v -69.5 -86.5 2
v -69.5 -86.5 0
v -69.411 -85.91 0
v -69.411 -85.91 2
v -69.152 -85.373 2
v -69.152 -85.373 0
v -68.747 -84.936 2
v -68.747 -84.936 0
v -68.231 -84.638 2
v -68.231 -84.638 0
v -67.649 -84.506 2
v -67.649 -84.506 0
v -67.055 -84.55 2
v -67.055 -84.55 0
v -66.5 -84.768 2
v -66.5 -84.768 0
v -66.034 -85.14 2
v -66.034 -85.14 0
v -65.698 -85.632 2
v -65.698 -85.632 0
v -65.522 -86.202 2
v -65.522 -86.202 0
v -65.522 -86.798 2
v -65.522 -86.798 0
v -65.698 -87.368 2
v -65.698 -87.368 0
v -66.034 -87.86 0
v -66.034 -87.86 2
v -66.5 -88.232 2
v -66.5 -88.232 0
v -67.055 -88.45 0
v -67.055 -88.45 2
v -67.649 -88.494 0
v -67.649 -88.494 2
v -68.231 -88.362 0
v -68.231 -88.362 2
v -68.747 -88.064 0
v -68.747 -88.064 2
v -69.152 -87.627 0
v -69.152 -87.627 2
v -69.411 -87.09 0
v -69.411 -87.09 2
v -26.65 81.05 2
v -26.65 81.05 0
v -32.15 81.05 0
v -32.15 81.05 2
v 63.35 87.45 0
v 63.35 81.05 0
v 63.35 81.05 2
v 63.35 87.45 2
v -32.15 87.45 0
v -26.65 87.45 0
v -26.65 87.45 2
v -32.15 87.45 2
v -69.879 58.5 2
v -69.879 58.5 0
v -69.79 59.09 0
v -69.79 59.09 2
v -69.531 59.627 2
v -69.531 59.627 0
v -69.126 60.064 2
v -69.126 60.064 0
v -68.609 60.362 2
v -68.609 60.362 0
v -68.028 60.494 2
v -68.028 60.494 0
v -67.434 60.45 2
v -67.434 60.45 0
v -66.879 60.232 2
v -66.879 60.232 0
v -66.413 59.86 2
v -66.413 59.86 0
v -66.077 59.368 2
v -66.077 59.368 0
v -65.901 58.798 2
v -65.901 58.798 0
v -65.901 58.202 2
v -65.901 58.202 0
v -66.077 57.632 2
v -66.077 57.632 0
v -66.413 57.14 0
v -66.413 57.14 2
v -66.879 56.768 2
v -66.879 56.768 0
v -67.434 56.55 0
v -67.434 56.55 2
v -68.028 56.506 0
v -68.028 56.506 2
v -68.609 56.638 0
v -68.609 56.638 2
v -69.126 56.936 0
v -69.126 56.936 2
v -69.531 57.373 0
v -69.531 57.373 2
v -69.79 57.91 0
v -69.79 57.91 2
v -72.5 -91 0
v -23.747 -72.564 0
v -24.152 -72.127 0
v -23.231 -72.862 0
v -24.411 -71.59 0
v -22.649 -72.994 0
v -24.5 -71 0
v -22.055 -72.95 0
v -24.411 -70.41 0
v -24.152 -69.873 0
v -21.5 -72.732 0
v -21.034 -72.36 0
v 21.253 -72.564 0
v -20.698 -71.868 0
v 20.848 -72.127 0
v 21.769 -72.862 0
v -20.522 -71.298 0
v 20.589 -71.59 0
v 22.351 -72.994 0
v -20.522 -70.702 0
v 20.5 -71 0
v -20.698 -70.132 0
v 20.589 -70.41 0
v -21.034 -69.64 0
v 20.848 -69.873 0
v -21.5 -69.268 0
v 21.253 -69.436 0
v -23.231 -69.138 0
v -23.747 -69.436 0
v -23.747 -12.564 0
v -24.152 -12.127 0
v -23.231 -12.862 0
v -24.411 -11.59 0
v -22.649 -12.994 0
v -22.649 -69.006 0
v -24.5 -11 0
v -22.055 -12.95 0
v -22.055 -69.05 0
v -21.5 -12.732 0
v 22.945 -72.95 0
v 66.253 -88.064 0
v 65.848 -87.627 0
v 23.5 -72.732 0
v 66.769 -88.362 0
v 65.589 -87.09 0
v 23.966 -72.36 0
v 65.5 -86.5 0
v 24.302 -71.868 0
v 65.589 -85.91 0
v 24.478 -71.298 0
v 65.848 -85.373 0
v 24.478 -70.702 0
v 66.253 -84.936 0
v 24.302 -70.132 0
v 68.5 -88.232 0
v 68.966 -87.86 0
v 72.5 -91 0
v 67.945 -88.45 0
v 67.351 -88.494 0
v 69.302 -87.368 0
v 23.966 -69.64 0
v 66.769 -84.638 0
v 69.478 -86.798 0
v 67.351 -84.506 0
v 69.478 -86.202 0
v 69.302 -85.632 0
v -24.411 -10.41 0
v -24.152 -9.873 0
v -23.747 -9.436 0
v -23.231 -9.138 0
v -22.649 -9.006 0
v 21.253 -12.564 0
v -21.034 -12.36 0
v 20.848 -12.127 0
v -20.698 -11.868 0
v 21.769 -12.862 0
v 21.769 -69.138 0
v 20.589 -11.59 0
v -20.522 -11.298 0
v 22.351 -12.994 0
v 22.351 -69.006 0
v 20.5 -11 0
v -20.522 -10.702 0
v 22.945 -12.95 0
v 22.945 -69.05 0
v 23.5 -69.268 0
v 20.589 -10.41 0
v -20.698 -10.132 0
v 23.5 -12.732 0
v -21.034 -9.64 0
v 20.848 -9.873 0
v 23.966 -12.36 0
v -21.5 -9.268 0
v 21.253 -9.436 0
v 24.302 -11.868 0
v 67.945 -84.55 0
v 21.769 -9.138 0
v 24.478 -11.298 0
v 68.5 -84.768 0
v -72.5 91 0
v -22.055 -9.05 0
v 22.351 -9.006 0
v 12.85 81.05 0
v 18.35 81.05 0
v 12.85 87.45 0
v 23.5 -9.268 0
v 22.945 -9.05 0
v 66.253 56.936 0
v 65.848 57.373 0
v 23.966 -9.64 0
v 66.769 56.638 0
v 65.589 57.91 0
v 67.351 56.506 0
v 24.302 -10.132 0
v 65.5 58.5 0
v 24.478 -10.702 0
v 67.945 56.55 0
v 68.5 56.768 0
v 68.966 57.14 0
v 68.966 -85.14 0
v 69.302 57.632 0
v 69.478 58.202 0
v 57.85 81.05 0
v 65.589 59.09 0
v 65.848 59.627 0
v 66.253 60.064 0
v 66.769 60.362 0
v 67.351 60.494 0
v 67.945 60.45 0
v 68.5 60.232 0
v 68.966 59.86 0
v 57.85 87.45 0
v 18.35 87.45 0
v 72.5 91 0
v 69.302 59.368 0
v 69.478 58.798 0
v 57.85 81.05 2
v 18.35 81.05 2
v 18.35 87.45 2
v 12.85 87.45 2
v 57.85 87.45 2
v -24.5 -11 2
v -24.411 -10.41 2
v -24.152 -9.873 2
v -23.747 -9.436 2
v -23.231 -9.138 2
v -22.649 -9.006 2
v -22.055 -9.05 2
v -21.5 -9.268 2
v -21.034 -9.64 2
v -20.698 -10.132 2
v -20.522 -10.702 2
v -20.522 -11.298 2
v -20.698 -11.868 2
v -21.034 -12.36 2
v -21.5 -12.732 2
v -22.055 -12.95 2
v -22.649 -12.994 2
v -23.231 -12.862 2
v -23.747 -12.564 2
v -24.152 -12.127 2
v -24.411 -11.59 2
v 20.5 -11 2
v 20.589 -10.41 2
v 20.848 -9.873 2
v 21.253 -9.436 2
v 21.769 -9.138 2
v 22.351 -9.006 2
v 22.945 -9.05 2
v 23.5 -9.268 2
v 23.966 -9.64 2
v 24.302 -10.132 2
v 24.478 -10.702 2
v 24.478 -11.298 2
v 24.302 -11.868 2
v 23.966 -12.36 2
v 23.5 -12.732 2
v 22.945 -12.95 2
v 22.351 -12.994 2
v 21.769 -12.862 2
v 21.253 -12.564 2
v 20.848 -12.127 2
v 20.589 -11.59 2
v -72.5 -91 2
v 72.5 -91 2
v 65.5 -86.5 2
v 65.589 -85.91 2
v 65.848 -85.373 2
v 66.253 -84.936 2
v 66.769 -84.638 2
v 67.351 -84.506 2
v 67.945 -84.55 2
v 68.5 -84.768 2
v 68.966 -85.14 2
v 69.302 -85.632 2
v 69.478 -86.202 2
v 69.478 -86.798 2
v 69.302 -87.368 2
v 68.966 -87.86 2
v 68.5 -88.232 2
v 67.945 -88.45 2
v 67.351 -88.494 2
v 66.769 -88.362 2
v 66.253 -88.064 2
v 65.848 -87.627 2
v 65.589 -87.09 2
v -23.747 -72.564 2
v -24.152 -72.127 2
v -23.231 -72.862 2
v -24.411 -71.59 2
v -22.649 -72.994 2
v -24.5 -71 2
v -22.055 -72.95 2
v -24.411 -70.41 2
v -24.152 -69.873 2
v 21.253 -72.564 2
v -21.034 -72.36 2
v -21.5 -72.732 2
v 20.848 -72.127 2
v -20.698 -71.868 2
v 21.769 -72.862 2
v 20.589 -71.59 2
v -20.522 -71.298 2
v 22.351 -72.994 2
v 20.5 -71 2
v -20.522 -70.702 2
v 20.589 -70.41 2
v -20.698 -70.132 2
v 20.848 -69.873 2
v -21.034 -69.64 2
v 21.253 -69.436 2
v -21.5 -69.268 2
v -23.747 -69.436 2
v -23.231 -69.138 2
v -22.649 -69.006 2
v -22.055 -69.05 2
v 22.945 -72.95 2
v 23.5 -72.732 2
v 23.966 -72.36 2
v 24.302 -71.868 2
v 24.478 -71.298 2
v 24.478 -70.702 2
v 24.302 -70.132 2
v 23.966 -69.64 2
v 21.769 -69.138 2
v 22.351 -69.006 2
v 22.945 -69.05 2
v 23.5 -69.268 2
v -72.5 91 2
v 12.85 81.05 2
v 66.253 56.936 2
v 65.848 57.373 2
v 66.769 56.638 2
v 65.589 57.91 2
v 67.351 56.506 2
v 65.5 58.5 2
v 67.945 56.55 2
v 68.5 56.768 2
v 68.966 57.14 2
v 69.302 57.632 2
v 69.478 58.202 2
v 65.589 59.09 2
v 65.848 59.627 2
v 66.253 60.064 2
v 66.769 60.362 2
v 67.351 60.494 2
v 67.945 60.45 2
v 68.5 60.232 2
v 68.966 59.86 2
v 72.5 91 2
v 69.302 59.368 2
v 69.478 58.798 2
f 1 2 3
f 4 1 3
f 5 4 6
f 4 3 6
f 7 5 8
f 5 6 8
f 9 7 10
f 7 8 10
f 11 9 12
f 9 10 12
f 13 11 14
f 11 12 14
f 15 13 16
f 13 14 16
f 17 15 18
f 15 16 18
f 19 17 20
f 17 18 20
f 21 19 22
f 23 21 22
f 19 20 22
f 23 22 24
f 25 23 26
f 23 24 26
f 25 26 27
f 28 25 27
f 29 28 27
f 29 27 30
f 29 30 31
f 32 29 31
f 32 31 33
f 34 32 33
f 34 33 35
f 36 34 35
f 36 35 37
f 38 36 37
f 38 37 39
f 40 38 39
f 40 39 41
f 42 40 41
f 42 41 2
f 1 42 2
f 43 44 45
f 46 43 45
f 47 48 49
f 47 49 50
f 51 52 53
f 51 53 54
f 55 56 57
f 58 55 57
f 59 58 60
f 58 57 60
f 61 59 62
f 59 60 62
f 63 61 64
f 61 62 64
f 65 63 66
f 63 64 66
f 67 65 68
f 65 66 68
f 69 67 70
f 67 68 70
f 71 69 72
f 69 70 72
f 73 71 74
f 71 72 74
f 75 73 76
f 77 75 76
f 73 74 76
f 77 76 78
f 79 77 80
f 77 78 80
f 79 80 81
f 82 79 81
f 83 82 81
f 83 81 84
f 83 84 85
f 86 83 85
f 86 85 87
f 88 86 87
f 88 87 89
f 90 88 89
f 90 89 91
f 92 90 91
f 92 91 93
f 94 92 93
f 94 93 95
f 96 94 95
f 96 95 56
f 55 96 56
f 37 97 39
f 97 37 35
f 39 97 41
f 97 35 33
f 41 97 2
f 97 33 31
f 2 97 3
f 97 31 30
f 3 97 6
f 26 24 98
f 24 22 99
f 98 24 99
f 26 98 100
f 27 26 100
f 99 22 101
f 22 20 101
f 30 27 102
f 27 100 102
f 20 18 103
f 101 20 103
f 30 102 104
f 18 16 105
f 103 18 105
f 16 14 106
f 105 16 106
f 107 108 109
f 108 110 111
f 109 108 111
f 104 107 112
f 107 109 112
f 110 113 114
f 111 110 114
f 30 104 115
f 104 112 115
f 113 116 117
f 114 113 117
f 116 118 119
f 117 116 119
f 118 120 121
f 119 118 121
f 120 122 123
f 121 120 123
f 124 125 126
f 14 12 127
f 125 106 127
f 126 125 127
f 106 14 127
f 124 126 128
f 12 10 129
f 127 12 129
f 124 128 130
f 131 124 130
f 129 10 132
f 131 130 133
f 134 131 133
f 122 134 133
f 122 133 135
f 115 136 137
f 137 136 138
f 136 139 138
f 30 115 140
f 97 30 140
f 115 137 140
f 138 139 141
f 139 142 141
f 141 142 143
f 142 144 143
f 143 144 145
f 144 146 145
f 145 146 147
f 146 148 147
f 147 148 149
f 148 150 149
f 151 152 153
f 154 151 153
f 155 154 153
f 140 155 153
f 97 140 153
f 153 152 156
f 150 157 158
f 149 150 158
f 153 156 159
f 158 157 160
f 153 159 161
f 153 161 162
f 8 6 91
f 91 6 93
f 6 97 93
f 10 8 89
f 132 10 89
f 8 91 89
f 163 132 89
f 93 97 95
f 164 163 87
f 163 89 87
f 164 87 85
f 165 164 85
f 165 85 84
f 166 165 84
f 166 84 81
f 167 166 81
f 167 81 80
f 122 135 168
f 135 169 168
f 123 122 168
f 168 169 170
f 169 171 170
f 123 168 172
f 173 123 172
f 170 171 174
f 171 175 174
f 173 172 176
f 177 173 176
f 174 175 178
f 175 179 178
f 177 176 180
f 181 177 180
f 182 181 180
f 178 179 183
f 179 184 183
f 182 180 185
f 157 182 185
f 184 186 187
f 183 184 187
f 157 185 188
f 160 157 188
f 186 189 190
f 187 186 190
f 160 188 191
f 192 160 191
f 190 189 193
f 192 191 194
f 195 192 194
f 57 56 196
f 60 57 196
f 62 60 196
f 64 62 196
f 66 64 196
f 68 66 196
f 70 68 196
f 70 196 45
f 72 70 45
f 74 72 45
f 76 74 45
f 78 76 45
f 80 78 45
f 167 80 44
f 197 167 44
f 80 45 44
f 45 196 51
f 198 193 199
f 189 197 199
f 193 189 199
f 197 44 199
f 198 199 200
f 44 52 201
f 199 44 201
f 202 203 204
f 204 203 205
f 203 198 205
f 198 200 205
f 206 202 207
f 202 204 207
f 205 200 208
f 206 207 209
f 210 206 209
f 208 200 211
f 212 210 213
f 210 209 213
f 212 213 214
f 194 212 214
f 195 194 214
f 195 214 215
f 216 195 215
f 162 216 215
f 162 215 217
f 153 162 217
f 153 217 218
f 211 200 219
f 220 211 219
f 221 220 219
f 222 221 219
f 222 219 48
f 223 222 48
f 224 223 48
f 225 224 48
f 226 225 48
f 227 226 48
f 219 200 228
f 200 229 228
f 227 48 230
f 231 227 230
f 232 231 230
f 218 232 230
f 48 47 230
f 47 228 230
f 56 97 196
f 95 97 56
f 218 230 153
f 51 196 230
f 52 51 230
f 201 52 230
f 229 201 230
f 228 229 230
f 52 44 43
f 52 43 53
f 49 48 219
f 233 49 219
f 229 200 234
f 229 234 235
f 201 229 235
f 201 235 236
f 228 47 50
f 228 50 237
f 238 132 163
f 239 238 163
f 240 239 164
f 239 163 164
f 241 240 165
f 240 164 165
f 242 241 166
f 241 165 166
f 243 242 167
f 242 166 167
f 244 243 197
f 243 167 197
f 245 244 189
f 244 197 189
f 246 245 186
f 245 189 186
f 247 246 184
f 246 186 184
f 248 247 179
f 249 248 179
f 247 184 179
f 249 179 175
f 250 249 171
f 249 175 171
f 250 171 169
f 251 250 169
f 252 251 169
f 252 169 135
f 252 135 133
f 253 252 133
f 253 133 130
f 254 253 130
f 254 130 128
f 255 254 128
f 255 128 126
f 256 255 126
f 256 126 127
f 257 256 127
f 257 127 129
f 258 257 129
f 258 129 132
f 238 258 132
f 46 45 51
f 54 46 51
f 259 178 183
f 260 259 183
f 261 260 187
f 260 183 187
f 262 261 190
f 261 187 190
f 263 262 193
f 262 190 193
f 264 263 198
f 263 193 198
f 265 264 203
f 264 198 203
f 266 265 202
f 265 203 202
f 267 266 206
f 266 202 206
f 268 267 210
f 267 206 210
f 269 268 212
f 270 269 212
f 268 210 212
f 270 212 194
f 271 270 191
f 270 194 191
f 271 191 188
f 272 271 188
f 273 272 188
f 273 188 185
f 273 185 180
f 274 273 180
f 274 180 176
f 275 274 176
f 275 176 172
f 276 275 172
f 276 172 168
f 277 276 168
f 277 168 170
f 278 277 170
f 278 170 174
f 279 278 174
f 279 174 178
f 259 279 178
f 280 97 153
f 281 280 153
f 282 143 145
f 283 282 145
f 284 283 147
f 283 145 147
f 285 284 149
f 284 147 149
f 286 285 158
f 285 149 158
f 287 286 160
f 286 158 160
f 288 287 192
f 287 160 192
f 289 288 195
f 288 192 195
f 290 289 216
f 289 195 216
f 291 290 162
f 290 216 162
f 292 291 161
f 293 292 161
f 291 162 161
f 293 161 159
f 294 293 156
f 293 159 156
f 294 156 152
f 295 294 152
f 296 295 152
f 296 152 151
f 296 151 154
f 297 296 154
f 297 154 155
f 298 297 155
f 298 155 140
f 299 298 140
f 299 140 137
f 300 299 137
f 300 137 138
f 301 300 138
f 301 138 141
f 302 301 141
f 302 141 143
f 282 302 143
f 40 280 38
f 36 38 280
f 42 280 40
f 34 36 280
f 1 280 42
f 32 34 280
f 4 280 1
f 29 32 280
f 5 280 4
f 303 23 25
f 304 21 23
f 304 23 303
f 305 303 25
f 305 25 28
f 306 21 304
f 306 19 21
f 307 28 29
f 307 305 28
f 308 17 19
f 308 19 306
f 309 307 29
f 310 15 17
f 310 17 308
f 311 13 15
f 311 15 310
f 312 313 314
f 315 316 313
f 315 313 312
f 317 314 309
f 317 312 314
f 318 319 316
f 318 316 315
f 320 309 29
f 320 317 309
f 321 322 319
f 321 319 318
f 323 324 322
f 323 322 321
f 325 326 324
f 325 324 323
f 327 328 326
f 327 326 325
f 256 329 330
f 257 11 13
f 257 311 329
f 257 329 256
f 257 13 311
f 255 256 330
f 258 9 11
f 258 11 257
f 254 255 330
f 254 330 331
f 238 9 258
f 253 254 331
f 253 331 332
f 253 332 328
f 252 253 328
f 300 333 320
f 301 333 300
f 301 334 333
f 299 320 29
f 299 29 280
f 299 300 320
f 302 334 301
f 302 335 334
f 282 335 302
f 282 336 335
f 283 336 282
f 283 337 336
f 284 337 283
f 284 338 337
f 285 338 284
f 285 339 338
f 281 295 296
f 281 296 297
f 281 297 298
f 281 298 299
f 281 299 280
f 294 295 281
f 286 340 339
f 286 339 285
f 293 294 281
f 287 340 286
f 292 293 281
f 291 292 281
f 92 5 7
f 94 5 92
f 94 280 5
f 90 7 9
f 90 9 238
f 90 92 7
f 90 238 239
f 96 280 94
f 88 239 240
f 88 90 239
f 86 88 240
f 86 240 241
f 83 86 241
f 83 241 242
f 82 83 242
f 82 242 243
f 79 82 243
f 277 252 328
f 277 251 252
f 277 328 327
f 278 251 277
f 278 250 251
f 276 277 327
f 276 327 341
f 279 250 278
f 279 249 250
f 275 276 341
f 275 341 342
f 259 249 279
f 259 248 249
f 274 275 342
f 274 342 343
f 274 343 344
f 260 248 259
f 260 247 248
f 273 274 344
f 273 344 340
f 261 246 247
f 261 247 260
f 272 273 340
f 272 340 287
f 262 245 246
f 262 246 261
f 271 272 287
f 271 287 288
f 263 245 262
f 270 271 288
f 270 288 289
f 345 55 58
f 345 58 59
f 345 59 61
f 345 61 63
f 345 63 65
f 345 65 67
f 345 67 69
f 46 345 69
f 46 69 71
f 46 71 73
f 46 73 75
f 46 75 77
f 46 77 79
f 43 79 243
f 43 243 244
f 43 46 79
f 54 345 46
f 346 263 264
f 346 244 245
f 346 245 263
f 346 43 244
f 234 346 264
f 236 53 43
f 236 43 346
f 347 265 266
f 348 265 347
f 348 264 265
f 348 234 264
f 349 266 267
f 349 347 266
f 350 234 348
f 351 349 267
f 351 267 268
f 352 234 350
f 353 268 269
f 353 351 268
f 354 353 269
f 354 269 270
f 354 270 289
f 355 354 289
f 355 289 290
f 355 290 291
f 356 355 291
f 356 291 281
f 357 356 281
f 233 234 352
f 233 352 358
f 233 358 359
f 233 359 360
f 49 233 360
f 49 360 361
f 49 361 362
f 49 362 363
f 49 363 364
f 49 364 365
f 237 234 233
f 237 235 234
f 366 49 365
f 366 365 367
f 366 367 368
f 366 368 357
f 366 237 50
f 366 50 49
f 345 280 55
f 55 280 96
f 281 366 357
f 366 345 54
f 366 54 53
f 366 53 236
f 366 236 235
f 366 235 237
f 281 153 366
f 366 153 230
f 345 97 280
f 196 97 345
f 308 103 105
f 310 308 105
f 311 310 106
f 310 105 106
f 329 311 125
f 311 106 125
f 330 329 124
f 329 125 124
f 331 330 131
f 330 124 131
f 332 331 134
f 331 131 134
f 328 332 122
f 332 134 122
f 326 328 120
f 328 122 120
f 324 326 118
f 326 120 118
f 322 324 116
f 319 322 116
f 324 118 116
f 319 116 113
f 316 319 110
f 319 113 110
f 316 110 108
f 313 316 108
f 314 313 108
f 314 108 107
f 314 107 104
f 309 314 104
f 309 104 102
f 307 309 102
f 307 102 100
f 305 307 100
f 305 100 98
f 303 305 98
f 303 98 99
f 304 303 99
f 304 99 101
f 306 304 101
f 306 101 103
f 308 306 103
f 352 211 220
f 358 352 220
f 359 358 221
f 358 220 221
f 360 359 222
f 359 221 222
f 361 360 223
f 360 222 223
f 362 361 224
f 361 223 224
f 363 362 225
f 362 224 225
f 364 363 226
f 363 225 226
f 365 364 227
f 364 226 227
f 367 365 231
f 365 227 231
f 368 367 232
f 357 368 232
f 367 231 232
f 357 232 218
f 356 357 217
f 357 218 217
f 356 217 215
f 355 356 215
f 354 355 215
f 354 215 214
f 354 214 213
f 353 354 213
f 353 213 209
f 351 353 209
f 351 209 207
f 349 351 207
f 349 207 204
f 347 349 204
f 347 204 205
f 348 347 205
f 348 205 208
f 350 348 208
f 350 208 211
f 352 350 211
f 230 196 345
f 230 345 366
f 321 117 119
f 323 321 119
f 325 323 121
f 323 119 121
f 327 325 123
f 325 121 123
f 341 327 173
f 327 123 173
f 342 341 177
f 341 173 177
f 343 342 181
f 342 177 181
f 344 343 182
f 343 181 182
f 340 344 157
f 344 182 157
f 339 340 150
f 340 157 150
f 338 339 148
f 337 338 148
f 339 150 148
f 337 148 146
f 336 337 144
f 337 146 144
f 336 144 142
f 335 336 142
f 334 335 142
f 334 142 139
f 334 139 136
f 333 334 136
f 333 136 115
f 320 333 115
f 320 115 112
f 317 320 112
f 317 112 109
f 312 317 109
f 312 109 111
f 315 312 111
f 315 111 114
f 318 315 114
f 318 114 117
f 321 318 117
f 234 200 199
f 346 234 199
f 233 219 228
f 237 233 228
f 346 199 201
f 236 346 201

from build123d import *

# Parameters (mm, degrees)
SZKIC1_W                    = 145
SZKIC1_H                    = 182
DODANIE_WYCI_GNI_CIE1_DEPTH = 2
SZKIC2_R                    = 2
WYTNIJ_WYCI_GNI_CIE1_DEPTH  = 32
SZKIC3_W                    = 5.5
SZKIC3_H                    = 6.4
WYTNIJ_WYCI_GNI_CIE2_DEPTH  = 32
SZKIC4_R                    = 2
WYTNIJ_WYCI_GNI_CIE3_DEPTH  = 12


with BuildPart() as part:
    # Szkic1 → Dodanie-wyciągnięcie1 (new body)
    with BuildSketch(Plane.XY):
        Rectangle(SZKIC1_W, SZKIC1_H)
    extrude(amount=DODANIE_WYCI_GNI_CIE1_DEPTH)

    # Szkic2 → Wytnij-wyciągnięcie1 (cut)
    with BuildSketch(Plane(origin=(0, 0, 0), x_dir=(-1, 0, 0), z_dir=(0, 0, -1))):
        with Locations((-22.5, -11)):
            Circle(SZKIC2_R)
        with Locations((-22.5, -71)):
            Circle(SZKIC2_R)
        with Locations((22.5, -71)):
            Circle(SZKIC2_R)
        with Locations((22.5, -11)):
            Circle(SZKIC2_R)
    extrude(amount=-WYTNIJ_WYCI_GNI_CIE1_DEPTH, mode=Mode.SUBTRACT)

    # Szkic3 → Wytnij-wyciągnięcie2 (cut)
    with BuildSketch(Plane(origin=(0, 0, 0), x_dir=(-1, 0, 0), z_dir=(0, 0, -1))):
        with Locations((-15.6, 84.25)):
            Rectangle(SZKIC3_W, SZKIC3_H)
        with Locations((29.4, 84.25)):
            Rectangle(SZKIC3_W, SZKIC3_H)
        with Locations((-60.6, 84.25)):
            Rectangle(SZKIC3_W, SZKIC3_H)
    extrude(amount=-WYTNIJ_WYCI_GNI_CIE2_DEPTH, mode=Mode.SUBTRACT)

    # Szkic4 → Wytnij-wyciągnięcie3 (cut)
    with BuildSketch(Plane(origin=(0, 0, 0), x_dir=(-1, 0, 0), z_dir=(0, 0, -1))):
        with Locations((67.5, -86.5)):
            Circle(SZKIC4_R)
        with Locations((-67.5, -86.5)):
            Circle(SZKIC4_R)
        with Locations((-67.5, 58.5)):
            Circle(SZKIC4_R)
        with Locations((67.878744236, 58.5)):
            Circle(SZKIC4_R)
    extrude(amount=-WYTNIJ_WYCI_GNI_CIE3_DEPTH, mode=Mode.SUBTRACT)


solid = part.part
